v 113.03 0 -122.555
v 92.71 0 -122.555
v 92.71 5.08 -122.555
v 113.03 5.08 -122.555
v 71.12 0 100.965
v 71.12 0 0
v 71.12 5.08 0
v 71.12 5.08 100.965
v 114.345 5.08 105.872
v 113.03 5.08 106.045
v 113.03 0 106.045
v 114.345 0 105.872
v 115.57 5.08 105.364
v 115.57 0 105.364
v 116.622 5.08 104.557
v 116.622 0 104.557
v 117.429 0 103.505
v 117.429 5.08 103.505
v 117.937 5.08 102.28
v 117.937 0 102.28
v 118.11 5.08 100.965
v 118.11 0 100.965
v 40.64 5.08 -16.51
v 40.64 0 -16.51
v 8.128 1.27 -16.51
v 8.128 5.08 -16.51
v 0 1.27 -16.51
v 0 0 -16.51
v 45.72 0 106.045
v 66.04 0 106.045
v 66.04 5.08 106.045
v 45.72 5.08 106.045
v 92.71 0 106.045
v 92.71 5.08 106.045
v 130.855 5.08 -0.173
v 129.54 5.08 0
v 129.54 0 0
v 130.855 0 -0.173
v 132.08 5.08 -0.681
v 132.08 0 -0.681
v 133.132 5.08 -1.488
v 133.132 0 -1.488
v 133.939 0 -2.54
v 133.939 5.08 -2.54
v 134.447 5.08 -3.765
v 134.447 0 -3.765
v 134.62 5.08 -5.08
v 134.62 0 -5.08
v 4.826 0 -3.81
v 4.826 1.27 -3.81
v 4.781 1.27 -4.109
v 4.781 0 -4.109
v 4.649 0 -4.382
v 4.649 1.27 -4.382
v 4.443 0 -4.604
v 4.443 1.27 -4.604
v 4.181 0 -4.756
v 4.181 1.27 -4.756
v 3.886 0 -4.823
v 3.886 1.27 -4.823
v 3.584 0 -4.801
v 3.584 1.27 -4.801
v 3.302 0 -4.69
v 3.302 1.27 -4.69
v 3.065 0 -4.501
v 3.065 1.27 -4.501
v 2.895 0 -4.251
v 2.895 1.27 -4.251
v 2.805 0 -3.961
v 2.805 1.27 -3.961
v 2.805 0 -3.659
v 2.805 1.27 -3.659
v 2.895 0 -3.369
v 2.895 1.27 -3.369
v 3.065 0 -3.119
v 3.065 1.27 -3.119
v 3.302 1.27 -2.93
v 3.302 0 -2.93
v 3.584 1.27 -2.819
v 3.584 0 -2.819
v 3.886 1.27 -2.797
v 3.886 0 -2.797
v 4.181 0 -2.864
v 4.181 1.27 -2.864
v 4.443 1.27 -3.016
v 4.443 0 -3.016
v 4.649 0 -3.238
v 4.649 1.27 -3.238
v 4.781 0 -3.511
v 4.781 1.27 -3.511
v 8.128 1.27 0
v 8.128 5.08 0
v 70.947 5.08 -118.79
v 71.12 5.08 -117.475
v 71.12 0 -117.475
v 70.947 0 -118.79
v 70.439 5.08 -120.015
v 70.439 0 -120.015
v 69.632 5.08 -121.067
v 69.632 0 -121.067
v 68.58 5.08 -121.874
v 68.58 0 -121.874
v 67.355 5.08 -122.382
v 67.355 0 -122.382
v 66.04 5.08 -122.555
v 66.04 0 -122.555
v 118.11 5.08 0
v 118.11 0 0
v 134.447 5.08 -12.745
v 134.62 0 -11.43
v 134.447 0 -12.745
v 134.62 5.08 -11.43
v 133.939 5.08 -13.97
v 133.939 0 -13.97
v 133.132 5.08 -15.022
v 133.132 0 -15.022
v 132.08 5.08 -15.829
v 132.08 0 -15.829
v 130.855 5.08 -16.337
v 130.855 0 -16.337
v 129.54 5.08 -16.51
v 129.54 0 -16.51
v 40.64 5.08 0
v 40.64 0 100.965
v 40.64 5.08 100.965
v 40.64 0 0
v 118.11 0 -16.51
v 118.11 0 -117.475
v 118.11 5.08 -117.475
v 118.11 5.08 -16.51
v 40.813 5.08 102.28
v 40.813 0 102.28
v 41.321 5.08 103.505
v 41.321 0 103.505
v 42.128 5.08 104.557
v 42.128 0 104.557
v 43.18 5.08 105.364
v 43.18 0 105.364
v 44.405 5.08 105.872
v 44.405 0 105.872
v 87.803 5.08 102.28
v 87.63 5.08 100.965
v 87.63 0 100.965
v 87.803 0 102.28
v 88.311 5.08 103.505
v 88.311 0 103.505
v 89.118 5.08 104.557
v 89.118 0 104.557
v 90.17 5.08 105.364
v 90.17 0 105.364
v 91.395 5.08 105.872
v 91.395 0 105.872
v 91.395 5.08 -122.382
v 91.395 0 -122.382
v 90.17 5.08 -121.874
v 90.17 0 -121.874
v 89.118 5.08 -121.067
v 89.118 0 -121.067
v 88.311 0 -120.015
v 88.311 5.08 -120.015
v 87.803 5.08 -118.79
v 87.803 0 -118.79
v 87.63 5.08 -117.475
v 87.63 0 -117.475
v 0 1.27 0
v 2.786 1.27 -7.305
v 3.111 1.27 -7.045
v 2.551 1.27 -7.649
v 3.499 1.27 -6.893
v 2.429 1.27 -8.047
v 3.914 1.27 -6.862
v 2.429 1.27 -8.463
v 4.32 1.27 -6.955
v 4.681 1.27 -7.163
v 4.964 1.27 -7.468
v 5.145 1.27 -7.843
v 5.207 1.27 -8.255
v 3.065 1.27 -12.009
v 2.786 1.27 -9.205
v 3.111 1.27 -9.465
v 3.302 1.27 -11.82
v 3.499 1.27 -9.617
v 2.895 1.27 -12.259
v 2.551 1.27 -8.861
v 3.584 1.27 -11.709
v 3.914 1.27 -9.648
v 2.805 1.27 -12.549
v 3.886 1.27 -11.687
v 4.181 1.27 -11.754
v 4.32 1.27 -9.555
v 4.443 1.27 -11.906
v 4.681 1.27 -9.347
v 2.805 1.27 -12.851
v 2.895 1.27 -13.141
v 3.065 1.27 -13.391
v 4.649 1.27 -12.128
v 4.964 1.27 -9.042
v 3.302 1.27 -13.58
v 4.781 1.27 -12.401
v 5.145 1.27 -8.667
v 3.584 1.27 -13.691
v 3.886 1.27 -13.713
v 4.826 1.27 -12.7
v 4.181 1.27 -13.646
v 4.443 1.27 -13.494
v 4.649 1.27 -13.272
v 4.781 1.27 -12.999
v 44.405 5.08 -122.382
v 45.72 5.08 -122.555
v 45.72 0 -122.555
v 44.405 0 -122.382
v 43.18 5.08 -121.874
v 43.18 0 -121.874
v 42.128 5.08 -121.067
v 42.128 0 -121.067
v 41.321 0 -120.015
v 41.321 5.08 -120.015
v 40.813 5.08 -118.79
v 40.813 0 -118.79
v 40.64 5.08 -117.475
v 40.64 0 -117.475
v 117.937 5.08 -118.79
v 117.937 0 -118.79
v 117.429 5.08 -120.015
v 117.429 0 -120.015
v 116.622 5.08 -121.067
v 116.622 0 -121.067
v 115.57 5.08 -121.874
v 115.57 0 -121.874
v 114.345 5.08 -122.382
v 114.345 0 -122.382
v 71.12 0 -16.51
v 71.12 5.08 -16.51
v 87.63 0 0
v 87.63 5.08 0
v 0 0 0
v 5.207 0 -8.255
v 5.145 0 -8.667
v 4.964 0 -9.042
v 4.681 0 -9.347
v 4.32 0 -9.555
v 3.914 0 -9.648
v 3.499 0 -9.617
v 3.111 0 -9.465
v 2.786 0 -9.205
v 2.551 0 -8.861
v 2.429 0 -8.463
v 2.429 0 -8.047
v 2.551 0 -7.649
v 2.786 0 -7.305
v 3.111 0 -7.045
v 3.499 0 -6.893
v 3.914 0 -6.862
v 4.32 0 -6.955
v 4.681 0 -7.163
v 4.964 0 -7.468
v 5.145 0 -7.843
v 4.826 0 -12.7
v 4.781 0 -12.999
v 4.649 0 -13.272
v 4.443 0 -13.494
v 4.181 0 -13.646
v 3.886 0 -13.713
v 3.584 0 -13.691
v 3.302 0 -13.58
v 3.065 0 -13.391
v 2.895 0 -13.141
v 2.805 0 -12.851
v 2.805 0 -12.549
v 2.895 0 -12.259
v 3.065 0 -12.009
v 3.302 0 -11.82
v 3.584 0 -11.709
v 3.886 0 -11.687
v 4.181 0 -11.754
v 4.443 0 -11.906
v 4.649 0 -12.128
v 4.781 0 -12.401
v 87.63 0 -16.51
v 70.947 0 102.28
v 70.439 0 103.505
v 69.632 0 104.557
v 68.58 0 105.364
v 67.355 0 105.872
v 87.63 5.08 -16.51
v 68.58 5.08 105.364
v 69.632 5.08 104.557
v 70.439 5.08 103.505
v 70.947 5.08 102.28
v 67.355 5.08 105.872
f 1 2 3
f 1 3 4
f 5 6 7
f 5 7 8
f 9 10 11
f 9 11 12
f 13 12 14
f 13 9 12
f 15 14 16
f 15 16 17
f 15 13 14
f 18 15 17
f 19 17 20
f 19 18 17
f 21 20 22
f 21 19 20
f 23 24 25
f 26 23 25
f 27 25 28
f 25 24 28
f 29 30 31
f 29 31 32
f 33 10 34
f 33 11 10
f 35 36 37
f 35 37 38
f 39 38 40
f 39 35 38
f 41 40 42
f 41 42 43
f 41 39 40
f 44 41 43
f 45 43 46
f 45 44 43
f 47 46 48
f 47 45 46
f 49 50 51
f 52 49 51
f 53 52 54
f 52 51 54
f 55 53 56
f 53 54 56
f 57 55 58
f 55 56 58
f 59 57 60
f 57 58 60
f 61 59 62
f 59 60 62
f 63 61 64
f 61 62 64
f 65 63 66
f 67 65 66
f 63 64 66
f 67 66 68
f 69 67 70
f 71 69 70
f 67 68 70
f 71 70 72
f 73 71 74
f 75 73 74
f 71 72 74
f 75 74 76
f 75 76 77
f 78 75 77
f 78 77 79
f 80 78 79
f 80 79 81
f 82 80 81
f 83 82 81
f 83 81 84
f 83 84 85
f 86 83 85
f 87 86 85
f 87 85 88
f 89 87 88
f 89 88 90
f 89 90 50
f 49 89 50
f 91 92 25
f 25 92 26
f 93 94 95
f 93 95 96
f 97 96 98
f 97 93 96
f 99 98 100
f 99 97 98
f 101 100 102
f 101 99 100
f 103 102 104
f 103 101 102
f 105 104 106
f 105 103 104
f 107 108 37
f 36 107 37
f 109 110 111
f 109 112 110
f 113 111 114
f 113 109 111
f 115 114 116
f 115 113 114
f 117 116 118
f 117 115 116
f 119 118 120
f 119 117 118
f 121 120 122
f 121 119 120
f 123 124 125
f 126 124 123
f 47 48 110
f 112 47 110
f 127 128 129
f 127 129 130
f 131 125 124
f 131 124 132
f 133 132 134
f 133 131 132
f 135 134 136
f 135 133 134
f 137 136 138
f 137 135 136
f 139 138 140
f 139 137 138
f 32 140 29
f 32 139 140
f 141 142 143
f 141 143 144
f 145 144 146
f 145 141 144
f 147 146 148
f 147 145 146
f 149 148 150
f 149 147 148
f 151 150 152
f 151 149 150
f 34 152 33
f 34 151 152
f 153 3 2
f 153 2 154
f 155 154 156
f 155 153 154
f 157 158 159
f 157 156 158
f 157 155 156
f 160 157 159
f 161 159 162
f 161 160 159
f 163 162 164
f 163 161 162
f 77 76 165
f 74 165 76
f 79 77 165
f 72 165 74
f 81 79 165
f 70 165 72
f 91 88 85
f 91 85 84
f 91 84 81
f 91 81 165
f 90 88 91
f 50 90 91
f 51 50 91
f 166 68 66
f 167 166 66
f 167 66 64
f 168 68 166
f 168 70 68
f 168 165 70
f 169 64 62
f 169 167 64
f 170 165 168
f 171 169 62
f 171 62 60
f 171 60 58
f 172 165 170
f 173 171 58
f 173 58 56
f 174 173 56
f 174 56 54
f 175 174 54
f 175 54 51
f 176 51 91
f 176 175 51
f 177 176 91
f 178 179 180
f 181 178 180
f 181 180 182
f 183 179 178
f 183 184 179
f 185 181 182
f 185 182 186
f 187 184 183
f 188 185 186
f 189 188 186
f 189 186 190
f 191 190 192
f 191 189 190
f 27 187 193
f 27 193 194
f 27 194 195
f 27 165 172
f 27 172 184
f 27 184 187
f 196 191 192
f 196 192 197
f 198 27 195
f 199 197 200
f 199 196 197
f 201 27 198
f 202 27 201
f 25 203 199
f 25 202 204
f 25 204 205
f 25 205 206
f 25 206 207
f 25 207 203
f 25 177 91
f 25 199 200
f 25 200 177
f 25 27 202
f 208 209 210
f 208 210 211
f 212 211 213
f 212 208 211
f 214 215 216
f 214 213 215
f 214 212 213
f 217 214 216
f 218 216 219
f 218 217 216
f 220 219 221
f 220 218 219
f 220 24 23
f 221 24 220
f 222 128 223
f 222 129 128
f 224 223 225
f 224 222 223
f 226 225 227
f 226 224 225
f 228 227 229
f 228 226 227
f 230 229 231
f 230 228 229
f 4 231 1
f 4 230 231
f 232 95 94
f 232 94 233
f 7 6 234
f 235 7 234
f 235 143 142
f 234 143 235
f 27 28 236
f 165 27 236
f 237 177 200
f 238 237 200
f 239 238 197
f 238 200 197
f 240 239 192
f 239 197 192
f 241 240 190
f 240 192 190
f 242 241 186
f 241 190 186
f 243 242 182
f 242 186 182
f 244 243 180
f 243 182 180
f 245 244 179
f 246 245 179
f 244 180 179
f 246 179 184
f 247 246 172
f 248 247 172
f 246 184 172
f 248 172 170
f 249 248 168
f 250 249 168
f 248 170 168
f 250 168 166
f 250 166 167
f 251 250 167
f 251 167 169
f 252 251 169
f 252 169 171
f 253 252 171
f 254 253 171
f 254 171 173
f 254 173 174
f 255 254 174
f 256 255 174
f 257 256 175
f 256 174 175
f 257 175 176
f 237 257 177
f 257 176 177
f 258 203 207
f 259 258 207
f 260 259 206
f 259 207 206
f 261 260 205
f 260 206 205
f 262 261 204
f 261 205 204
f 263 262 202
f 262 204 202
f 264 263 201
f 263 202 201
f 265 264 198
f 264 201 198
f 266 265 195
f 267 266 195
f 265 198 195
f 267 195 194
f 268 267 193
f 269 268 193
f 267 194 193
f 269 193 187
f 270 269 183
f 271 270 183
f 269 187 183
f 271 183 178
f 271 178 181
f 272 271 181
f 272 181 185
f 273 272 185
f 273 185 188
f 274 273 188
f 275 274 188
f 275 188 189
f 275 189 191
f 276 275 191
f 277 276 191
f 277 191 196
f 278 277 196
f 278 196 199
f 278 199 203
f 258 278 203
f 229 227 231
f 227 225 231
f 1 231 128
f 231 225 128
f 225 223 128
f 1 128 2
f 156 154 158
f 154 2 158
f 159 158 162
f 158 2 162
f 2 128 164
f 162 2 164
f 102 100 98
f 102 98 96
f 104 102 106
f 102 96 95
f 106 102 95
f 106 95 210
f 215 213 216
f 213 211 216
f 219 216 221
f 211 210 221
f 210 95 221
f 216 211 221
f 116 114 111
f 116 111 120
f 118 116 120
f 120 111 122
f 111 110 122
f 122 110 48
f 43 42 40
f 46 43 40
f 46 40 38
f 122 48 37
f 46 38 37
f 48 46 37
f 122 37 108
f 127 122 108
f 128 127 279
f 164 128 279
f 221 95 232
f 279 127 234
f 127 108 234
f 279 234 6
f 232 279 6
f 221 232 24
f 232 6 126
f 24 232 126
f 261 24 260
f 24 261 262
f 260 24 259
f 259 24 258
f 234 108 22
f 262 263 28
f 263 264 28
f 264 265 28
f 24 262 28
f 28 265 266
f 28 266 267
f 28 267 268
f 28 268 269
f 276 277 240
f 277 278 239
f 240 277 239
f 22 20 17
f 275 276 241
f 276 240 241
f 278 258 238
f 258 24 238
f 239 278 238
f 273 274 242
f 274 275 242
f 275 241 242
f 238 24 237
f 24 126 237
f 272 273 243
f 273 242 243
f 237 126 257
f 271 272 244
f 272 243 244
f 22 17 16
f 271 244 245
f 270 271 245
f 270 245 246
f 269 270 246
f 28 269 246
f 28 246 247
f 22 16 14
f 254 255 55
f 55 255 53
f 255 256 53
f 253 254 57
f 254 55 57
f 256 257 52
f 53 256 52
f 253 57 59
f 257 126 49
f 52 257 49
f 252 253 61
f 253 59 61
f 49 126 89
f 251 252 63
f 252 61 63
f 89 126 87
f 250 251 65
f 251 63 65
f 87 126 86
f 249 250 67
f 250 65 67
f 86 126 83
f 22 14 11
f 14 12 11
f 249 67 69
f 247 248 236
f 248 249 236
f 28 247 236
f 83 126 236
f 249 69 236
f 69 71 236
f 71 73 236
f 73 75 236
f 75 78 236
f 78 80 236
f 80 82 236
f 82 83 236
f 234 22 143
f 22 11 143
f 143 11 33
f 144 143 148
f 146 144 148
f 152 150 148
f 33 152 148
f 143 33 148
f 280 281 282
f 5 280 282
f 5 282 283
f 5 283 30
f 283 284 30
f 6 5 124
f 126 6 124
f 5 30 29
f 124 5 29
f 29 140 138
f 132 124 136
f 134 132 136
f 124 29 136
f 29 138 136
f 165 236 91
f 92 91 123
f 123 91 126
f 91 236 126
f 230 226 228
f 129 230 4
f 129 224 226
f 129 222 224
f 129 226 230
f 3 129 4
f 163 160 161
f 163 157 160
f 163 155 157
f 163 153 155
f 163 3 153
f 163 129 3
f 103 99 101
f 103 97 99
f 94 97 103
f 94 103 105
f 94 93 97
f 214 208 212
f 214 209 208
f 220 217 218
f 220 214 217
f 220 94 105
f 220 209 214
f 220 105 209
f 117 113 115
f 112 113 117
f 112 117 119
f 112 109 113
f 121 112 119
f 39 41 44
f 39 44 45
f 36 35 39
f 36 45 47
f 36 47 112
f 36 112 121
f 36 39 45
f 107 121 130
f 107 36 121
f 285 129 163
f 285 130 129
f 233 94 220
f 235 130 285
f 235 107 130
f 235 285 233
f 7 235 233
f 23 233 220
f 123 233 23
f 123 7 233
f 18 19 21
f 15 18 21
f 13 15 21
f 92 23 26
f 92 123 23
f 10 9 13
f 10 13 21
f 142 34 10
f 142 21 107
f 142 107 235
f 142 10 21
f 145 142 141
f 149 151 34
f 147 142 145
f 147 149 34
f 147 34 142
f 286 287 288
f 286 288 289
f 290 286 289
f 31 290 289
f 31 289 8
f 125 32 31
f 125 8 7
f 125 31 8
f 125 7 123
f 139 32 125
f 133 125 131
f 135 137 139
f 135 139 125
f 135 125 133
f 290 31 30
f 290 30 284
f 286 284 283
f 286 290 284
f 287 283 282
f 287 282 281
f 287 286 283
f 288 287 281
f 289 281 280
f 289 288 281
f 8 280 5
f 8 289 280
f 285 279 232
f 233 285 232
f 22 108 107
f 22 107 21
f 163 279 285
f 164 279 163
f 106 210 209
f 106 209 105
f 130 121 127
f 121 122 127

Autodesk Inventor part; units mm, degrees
ref_plane "YZ Plane" through (0, 0, 0) normal (1, 0, 0) x (0, 1, 0)
ref_plane "XZ Plane" through (0, 0, 0) normal (0, 1, 0) x (-1, 0, 0)
ref_plane "XY Plane" through (0, 0, 0) normal (0, 0, 1) x (1, 0, 0)
sketch "Sketch1" plane through (0, 0, 0) normal (0, 1, 0) x (-1, 0, 0)
  line L0 (0, 0) -> (-134.62, 0)
  line L1 (-134.62, 0) -> (-134.62, -16.51)
  line L2 (-134.62, -16.51) -> (0, -16.51)
  line L3 (0, -16.51) -> (0, 0)
  line L4 (-134.62, -8.255) -> (-118.11, -8.255)
  line L5 (-118.11, -8.255) -> (-87.63, -8.255)
  line L6 (-87.63, -8.255) -> (-71.12, -8.255)
  line L7 (-71.12, -8.255) -> (-40.64, -8.255)
  line L8 (-40.64, -8.255) -> (-40.64, -122.555)
  line L9 (-40.64, -122.555) -> (-71.12, -122.555)
  line L10 (-71.12, -122.555) -> (-71.12, -8.255)
  line L11 (-87.63, -8.255) -> (-87.63, -122.555)
  line L12 (-87.63, -122.555) -> (-118.11, -122.555)
  line L13 (-118.11, -122.555) -> (-118.11, -8.255)
  line L14 (-118.11, -8.255) -> (-118.11, 106.045)
  line L15 (-118.11, 106.045) -> (-87.63, 106.045)
  line L16 (-87.63, 106.045) -> (-87.63, -8.255)
  line L17 (-71.12, -8.255) -> (-71.12, 106.045)
  line L18 (-71.12, 106.045) -> (-40.64, 106.045)
  line L19 (-40.64, 106.045) -> (-40.64, -8.255)
  dimension "d0" = 134.62
  dimension "d1" = 16.51
  dimension "d2" = 16.51
  dimension "d3" = 30.48
  dimension "d4" = 16.51
  dimension "d5" = 30.48
  dimension "d7" = 114.3
  dimension "d8" = 30.48
  dimension "d9" = 114.3
  dimension "d10" = 30.48
  dimension "d11" = 114.3
  dimension "d12" = 30.48
  dimension "d13" = 114.3
  dimension "d14" = 30.48
extrude "Extrusion1" add sketch "Sketch1" along normal blind 5.08
fillet "Fillet1" radius 5.08 7 edges at (40.64, 2.54, -122.555) (71.12, 2.54, -122.555) (87.63, 2.54, -122.555) (118.11, 2.54, -122.555) (40.64, 2.54, 106.045) (87.63, 2.54, 106.045) (134.62, 2.54, -16.51)
fillet "Fillet2" radius 5.08 3 edges at (71.12, 2.54, 106.045) (118.11, 2.54, 106.045) (134.62, 2.54, 0)
sketch "Sketch2" plane through (0, 5.08, 0) normal (0, 1, 0) x (1, 0, 0)
  line L0 (40.64, 16.51) -> (0, 16.51) projected
  line L1 (0, 0) -> (8.128, 0)
  line L2 (8.128, 0) -> (8.128, 16.51)
  line L3 (8.128, 16.51) -> (0, 16.51)
  line L4 (0, 16.51) -> (0, 0)
  dimension "d19" = 8.128
extrude "Extrusion2" cut sketch "Sketch2" against normal blind 3.81
sketch "Sketch3" plane through (0, 1.27, 0) normal (0, 1, 0) x (1, 0, 0)
  line L0 (0, 16.51) -> (0, 0) projected
  line L1 (0, 8.255) -> (3.81, 8.255)
  circle A0 centre (3.81, 8.255) radius 1.397
  line L2 (3.81, 0) -> (3.81, 3.81)
  line L3 (3.81, 16.51) -> (3.81, 12.7)
  circle A1 centre (3.81, 12.7) radius 1.016
  circle A2 centre (3.81, 3.81) radius 1.016
  dimension "d22" = 3.81
  dimension "d23" = 2.794
  dimension "d24" = 3.81
  dimension "d25" = 3.81
  dimension "d26" = 2.032
  dimension "d27" = 2.032
extrude "Extrusion3" cut sketch "Sketch3" against normal blind 1.27
properties part number "Grab Holder v1"
